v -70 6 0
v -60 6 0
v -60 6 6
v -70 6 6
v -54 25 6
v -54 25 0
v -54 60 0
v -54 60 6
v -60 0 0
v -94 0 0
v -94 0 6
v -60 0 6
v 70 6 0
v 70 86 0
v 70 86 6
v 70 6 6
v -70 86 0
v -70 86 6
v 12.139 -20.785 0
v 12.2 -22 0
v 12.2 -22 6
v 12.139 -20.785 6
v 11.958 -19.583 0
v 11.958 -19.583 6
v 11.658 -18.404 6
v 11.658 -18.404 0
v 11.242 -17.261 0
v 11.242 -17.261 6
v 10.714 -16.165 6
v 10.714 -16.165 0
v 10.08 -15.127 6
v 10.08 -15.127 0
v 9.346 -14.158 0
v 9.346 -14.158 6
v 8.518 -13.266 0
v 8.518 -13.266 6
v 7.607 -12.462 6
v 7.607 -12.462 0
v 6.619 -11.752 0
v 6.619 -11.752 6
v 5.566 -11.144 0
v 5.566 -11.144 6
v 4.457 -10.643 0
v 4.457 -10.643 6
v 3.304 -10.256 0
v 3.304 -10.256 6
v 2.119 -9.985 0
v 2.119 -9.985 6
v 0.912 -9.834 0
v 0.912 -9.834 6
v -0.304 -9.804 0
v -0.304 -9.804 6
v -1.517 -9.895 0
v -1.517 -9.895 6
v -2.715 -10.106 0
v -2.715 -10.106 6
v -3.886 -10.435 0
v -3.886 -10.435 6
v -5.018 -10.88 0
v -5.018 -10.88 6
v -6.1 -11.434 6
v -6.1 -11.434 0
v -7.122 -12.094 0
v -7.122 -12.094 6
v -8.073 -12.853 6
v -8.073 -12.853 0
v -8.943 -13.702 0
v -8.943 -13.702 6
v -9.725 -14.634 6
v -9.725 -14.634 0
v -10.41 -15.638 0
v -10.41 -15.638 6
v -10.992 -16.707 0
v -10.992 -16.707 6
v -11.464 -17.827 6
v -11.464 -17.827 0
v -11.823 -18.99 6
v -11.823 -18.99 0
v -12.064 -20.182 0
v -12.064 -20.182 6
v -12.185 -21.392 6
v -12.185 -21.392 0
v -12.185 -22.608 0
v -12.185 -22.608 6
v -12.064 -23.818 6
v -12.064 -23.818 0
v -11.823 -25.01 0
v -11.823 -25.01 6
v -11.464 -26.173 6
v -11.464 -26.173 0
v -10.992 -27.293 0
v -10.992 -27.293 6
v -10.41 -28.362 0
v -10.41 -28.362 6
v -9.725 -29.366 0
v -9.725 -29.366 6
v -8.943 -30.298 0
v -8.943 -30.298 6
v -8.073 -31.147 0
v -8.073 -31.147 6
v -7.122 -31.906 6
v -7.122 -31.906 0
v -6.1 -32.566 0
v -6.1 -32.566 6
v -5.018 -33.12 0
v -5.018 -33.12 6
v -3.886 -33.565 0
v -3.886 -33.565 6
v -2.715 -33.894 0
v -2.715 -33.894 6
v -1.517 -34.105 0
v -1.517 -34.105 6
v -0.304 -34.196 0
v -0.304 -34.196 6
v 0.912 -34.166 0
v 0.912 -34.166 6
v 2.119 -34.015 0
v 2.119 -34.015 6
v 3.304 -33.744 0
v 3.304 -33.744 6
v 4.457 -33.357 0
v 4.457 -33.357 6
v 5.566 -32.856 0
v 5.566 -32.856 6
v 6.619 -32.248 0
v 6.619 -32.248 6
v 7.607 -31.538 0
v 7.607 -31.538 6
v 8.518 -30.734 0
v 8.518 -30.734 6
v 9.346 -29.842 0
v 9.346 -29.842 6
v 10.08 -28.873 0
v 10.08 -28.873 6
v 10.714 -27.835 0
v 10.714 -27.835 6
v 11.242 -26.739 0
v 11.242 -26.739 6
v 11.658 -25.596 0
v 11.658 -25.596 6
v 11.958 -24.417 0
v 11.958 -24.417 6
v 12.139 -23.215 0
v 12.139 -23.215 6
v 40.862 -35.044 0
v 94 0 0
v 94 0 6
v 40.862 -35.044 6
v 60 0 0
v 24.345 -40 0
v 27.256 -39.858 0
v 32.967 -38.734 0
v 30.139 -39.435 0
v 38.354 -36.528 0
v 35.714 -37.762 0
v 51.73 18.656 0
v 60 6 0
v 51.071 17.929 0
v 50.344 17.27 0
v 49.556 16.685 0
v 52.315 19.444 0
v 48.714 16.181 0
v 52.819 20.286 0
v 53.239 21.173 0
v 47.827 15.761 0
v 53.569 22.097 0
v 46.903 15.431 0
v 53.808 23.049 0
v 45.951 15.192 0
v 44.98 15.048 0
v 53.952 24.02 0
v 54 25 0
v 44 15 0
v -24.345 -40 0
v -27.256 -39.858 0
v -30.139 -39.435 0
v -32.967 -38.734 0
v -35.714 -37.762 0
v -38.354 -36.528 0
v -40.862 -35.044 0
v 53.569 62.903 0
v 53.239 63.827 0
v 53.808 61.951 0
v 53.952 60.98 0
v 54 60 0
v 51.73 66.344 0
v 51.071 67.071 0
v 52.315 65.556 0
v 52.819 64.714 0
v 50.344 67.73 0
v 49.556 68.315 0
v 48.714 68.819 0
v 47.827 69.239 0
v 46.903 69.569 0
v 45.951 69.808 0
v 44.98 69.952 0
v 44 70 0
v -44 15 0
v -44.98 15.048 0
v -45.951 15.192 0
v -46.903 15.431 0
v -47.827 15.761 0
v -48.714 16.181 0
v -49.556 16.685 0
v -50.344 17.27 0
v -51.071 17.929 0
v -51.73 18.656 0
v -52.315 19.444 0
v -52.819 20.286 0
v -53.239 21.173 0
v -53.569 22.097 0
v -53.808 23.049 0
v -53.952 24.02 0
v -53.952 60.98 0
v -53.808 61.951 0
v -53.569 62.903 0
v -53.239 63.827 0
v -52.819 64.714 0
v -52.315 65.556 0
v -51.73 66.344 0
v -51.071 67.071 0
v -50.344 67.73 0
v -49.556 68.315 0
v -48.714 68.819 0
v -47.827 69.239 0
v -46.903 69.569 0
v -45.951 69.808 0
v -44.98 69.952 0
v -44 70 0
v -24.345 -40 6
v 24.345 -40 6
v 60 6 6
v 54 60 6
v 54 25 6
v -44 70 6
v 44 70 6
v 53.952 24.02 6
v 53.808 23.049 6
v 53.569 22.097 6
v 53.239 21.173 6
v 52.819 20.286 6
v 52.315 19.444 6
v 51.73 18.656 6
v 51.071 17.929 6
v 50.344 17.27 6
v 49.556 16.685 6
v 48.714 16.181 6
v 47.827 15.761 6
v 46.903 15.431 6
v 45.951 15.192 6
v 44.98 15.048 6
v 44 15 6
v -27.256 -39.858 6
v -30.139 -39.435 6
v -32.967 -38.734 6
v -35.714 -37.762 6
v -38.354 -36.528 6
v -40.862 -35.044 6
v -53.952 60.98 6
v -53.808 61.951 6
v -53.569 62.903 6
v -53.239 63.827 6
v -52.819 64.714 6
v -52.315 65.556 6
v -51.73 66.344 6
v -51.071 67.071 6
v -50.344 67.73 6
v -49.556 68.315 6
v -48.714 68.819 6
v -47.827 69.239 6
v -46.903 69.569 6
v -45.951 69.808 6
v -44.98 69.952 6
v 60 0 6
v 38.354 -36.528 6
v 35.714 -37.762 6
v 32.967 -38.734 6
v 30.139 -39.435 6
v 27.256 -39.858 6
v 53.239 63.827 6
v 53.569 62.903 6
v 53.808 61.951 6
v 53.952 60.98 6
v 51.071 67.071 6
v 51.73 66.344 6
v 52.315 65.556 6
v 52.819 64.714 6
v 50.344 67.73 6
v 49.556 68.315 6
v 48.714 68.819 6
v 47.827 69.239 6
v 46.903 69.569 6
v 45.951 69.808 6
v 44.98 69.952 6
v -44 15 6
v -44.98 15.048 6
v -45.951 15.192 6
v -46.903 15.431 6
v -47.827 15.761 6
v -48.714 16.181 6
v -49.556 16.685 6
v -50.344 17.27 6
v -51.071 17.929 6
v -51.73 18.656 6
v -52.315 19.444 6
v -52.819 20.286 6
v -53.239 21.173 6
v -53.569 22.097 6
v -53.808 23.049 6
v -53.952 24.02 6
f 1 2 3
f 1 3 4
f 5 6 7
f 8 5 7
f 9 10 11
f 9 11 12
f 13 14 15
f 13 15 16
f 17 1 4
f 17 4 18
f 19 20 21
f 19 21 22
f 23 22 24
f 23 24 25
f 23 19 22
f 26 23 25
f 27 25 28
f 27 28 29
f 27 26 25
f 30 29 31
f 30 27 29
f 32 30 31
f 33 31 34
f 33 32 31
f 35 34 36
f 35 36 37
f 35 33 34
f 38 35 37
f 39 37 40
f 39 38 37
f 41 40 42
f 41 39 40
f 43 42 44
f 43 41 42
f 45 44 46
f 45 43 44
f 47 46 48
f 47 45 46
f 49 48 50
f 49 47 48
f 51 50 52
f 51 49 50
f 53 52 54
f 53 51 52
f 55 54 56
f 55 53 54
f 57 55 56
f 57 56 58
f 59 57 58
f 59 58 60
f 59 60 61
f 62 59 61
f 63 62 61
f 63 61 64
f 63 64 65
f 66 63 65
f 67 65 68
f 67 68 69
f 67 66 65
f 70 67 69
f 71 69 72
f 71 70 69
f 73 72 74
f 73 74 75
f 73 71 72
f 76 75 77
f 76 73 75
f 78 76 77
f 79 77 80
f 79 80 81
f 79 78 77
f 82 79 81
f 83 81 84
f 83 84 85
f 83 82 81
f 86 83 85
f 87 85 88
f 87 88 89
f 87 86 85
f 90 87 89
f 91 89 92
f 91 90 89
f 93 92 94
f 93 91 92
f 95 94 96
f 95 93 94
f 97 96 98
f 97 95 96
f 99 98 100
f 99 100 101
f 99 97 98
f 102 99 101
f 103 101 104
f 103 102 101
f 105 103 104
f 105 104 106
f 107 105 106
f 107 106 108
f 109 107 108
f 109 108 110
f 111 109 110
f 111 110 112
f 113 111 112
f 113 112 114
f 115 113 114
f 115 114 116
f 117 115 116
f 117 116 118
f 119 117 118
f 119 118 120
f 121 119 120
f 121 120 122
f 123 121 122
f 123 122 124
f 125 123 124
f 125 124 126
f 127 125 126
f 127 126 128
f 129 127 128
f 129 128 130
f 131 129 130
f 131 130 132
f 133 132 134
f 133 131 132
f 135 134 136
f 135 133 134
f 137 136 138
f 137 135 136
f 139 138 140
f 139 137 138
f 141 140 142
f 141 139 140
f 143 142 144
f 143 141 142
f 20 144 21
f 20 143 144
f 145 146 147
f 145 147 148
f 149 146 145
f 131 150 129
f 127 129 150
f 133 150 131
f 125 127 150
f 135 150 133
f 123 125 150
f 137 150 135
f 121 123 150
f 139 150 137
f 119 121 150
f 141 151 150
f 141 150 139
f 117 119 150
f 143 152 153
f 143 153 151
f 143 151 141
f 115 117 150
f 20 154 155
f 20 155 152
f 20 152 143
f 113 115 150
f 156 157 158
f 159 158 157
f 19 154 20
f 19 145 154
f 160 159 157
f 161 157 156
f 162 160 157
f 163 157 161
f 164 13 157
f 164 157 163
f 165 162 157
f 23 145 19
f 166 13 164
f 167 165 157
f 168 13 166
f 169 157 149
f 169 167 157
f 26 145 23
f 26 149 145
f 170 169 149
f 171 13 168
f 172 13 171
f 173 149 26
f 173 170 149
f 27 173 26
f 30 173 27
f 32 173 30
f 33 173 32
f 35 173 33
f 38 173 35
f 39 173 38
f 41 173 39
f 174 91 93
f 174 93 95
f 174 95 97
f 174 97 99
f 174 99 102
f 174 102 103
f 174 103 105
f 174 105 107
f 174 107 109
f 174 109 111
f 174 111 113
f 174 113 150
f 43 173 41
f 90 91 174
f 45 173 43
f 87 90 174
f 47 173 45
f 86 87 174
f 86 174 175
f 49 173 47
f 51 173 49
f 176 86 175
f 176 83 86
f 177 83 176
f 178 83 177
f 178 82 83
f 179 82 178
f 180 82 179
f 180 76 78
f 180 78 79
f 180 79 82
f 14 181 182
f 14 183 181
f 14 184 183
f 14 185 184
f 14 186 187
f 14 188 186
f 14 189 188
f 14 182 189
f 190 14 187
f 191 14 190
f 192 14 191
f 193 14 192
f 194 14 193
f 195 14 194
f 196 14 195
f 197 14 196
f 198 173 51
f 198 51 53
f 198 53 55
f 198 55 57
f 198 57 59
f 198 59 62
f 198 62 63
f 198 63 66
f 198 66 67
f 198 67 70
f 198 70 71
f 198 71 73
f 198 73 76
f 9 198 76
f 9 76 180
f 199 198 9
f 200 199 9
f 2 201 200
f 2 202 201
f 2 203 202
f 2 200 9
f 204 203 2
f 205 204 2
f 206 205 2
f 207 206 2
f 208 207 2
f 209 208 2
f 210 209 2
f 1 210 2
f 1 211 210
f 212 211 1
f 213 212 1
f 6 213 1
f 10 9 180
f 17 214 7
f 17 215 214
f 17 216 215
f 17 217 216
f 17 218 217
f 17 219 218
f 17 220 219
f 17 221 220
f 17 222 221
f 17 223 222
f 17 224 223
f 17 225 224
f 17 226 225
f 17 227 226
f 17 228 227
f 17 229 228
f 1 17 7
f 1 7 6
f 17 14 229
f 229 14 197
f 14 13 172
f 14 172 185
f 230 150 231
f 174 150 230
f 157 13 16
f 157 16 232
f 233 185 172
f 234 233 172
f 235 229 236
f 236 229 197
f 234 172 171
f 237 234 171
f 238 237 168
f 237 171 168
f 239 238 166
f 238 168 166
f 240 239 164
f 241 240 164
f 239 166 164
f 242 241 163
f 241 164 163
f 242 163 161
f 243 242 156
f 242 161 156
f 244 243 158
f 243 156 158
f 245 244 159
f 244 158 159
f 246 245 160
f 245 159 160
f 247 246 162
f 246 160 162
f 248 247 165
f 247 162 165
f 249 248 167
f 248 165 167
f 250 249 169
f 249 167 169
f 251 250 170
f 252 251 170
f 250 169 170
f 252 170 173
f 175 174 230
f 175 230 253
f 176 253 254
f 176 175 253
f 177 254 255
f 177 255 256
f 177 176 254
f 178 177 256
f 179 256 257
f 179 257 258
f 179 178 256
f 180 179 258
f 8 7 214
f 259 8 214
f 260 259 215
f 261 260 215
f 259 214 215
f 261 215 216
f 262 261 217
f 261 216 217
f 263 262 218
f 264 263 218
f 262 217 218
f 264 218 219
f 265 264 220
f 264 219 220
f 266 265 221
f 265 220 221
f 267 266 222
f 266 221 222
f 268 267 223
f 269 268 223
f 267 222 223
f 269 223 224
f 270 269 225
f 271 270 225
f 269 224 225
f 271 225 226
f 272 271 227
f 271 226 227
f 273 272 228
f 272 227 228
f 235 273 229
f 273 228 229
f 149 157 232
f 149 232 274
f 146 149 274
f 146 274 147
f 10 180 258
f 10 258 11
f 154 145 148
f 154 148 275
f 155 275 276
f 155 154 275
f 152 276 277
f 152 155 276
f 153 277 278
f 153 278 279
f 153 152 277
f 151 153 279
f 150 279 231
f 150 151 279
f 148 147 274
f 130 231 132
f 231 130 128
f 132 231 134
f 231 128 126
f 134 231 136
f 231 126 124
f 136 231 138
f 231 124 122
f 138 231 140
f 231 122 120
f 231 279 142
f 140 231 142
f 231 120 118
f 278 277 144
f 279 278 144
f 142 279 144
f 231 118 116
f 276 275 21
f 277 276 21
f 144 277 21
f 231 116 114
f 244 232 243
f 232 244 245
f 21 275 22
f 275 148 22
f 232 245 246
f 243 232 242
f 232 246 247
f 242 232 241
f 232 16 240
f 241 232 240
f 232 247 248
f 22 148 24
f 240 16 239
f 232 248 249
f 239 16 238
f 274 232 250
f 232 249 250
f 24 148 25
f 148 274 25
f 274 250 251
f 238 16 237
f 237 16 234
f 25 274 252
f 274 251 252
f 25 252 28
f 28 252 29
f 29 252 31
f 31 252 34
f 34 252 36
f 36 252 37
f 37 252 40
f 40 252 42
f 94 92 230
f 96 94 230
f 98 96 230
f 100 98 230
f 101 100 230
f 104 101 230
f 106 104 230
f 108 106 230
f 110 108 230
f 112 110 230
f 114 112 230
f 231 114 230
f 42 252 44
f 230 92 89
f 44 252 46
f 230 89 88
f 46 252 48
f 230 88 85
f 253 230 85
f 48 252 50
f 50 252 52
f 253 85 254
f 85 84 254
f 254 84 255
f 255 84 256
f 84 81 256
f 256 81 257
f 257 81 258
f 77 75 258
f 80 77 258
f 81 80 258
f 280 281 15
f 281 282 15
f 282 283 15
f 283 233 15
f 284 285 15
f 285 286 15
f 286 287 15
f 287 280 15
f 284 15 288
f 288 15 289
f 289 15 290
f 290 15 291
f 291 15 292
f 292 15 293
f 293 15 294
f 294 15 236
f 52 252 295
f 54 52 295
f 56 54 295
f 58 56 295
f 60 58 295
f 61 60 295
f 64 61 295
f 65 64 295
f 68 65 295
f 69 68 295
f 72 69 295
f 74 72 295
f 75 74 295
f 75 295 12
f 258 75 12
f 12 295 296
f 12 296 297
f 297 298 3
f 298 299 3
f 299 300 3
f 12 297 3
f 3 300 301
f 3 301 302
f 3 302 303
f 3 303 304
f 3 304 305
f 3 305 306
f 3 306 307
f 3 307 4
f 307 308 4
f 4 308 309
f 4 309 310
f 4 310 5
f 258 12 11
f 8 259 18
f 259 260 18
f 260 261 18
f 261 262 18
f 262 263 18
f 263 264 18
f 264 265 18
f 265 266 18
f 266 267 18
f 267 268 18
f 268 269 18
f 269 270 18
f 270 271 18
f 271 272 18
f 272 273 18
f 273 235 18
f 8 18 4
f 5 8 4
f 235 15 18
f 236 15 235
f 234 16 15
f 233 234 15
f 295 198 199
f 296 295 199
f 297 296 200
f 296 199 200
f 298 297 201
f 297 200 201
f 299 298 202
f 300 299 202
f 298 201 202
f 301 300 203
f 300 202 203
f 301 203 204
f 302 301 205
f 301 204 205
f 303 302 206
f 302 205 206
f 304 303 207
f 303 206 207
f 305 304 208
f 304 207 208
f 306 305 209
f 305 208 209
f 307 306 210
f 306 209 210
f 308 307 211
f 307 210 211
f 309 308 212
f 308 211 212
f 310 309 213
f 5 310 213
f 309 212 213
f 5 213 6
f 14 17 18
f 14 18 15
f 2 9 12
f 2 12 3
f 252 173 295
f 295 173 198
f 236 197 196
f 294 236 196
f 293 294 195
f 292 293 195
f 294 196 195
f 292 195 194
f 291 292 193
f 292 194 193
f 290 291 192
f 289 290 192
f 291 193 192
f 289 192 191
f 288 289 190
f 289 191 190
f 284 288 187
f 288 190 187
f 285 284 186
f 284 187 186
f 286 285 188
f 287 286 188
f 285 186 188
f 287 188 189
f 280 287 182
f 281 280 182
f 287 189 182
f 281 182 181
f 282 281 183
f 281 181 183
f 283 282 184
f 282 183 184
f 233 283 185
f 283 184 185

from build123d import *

# Parameters (mm, degrees)
ESBO_O1_R                = 12.2
RESSALTO_EXTRUS_O1_DEPTH = 6


with BuildPart() as part:
    # Esboço1 → Ressalto-extrusão1 (new body)
    with BuildSketch(Plane.XY):
        with BuildLine():
            Line((-94, 0), (-60, 0))
            Line((-60, 0), (-60, 6))
            Line((-60, 6), (-70, 6))
            Line((-70, 6), (-70, 86))
            Line((-70, 86), (70, 86))
            Line((70, 86), (70, 6))
            Line((70, 6), (60, 6))
            Line((60, 6), (60, 0))
            Line((60, 0), (94, 0))
            Line((94, 0), (40.861662232, -35.044161486))
            ThreePointArc((40.861662232, -35.044161486), (32.967231691, -38.734342211), (24.345307444, -40))
            Line((24.345307444, -40), (-24.345307444, -40))
            ThreePointArc((-24.345307444, -40), (-32.967231691, -38.734342211), (-40.861662232, -35.044161486))
            Line((-40.861662232, -35.044161486), (-94, 0))
        make_face()
        with Locations((0, -22)):
            Circle(ESBO_O1_R, mode=Mode.SUBTRACT)
        with BuildLine():
            Line((54, 60), (54, 25))
            ThreePointArc((54, 25), (51.071067812, 17.928932188), (44, 15))
            Line((44, 15), (-44, 15))
            ThreePointArc((-44, 15), (-51.071067812, 17.928932188), (-54, 25))
            Line((-54, 25), (-54, 60))
            ThreePointArc((-54, 60), (-51.071067812, 67.071067812), (-44, 70))
            Line((-44, 70), (44, 70))
            ThreePointArc((44, 70), (51.071067812, 67.071067812), (54, 60))
        make_face(mode=Mode.SUBTRACT)
    extrude(amount=RESSALTO_EXTRUS_O1_DEPTH)


solid = part.part
